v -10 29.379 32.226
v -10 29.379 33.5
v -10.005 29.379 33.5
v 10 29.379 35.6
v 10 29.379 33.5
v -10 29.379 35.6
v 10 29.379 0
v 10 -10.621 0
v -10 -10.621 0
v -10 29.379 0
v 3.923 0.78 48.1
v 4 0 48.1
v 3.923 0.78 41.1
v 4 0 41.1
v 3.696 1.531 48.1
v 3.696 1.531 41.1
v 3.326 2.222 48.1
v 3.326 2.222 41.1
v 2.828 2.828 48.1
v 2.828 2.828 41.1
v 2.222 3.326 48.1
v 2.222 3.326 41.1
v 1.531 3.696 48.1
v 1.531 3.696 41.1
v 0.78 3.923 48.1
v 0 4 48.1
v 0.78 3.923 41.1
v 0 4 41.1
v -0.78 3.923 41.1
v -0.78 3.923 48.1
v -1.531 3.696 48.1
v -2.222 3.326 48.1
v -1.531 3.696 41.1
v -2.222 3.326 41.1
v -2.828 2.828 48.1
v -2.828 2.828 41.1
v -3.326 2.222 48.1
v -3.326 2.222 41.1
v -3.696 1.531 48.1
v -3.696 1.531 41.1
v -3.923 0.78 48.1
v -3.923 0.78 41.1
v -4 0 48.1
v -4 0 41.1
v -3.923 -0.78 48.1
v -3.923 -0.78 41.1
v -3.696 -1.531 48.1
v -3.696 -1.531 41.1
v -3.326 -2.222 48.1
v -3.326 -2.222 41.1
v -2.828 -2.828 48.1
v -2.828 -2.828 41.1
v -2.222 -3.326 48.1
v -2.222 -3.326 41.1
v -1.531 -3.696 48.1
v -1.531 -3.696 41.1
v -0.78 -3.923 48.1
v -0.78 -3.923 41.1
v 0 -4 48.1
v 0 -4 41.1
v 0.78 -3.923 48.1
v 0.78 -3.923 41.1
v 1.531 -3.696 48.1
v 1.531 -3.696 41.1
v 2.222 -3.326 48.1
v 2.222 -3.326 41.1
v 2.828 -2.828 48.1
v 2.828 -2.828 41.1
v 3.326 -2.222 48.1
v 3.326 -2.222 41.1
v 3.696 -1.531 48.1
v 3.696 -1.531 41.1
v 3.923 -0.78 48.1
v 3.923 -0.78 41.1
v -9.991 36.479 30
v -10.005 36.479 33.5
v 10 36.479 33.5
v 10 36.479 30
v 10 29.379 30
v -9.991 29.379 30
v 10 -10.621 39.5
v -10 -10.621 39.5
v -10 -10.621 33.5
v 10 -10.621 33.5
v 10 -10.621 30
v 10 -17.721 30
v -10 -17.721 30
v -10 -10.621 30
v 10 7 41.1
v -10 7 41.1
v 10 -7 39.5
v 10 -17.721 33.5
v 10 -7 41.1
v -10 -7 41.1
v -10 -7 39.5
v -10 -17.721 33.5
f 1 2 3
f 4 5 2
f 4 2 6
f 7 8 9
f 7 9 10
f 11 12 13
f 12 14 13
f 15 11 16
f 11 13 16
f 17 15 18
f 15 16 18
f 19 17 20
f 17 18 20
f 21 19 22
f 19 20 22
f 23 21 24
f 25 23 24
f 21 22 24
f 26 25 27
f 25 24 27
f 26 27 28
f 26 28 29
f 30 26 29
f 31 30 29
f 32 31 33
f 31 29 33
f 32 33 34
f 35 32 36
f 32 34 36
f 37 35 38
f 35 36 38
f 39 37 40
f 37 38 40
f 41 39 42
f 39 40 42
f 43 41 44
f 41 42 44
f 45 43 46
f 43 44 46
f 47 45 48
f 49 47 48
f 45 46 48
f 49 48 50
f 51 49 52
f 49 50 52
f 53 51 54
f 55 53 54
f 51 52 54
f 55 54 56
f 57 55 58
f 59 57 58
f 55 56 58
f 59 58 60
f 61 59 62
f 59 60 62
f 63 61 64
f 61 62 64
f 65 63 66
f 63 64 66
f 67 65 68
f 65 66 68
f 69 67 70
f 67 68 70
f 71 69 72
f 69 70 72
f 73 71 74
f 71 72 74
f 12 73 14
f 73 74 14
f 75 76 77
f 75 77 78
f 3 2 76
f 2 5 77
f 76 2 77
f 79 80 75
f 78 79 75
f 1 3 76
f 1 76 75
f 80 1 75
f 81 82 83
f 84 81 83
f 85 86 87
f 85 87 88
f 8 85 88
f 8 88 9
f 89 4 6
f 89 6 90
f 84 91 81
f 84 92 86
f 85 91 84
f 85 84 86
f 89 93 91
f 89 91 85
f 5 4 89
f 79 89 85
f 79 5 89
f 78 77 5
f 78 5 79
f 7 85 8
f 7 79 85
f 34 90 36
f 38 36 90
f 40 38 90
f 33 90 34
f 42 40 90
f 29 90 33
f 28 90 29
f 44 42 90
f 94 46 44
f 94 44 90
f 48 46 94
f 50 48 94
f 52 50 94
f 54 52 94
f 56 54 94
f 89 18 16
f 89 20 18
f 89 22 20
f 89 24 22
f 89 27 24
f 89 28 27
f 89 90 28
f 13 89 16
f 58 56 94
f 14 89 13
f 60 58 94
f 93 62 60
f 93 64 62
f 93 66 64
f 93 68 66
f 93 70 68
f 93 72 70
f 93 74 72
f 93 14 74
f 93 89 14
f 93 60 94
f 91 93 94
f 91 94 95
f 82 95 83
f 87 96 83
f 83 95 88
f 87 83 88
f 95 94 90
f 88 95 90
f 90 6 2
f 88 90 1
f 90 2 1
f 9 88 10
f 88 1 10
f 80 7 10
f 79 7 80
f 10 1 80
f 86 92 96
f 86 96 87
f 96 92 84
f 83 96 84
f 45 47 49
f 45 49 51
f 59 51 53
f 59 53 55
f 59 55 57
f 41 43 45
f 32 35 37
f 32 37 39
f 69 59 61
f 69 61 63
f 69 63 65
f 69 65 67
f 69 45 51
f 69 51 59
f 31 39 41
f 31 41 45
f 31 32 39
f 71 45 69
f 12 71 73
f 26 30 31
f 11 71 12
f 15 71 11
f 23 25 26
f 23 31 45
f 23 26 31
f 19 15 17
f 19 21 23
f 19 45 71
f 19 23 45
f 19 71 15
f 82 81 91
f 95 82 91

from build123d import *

# Parameters (mm, degrees)
BOSS_EXTRUDE1_DEPTH = 19.999999553
SKETCH2_W           = 29.999999329
SKETCH2_H           = 7.099999115
CUT_EXTRUDE1_DEPTH  = 55.335457568
SKETCH3_W           = 7.599998266
SKETCH3_H           = 7.099999115
CUT_EXTRUDE2_DEPTH  = 55.335457568
SKETCH4_W           = 1.599997282
SKETCH4_H           = 3.620889969
CUT_EXTRUDE3_DEPTH  = 55.335457568
BOSS_EXTRUDE2_REACH = 56.335
SKETCH6_W           = 3.500001505
SKETCH6_H           = 7.10000284
SKETCH7_R           = 4
BOSS_EXTRUDE3_DEPTH = 7
MOVE_FACE2_BY       = 6
MOVE_FACE3_BY       = 6


with BuildPart() as part:
    # Sketch1 → Boss-Extrude1 (new body)
    with BuildSketch(Plane(origin=(10, 0, 0), x_dir=(0, 0, -1), z_dir=(1, 0, 0))):
        Polygon((0, 29.379108921), (-35.59999913, 29.379108921), (-41.0999991, 7.000000216), (-41.0999991, -17.7208893), (0, -17.7208893), align=None)
    extrude(amount=-BOSS_EXTRUDE1_DEPTH)

    # Sketch2 → Cut-Extrude1 (cut, through all)
    with BuildSketch(Plane(origin=(10, 0, 0), x_dir=(0, 0, -1), z_dir=(1, 0, 0))):
        with Locations((-14.999999665, -14.170889742)):
            Rectangle(SKETCH2_W, SKETCH2_H)
    extrude(amount=-CUT_EXTRUDE1_DEPTH, mode=Mode.SUBTRACT)

    # Sketch3 → Cut-Extrude2 (cut, through all)
    with BuildSketch(Plane(origin=(10, 0, 0), x_dir=(0, 0, -1), z_dir=(1, 0, 0))):
        with Locations((-37.299999967, -14.170889742)):
            Rectangle(SKETCH3_W, SKETCH3_H)
    extrude(amount=-CUT_EXTRUDE2_DEPTH, mode=Mode.SUBTRACT)

    # Sketch4 → Cut-Extrude3 (cut, through all)
    with BuildSketch(Plane(origin=(10, 0, 0), x_dir=(0, 0, -1), z_dir=(1, 0, 0))):
        with Locations((-40.300000459, -8.810445201)):
            Rectangle(SKETCH4_W, SKETCH4_H)
    extrude(amount=-CUT_EXTRUDE3_DEPTH, mode=Mode.SUBTRACT)

    # Boss-Extrude2: up to this plane
    boss_extrude2_end = Plane(origin=(-9.873244788, 0, -0.038787862), z_dir=(-0.9999922832070416, 0, -0.003928552706520363))
    # Sketch6 → Boss-Extrude2 (add, up to the surface)
    with BuildSketch(Plane(origin=(10, 0, 0), x_dir=(0, 0, -1), z_dir=(1, 0, 0)), mode=Mode.PRIVATE) as boss_extrude2_sk1:
        with Locations((-31.750000082, 32.929110341)):
            Rectangle(SKETCH6_W, SKETCH6_H)
    boss_extrude2_tool1 = split(extrude(boss_extrude2_sk1.sketch, amount=-BOSS_EXTRUDE2_REACH, mode=Mode.PRIVATE), bisect_by=boss_extrude2_end, keep=Keep.BOTH, mode=Mode.PRIVATE)
    add(boss_extrude2_tool1.solids().sort_by_distance((10, 32.92911, 31.75))[0])

    # Sketch7 → Boss-Extrude3 (add)
    with BuildSketch(Plane.XY.offset(41.0999991)):
        Circle(SKETCH7_R)
    extrude(amount=BOSS_EXTRUDE3_DEPTH)

    # Move Face2: a face moved outward by 6.0
    extrude(part.faces().sort_by_distance((0, 0, 48.0999991))[0], amount=MOVE_FACE2_BY, dir=(0, 0, 1))

    # Move Face3: a face moved inward by 6.0
    extrude(part.faces().sort_by_distance((0, 0, 54.0999991))[0], amount=MOVE_FACE3_BY, dir=(0, 0, -1), mode=Mode.SUBTRACT)


solid = part.part
